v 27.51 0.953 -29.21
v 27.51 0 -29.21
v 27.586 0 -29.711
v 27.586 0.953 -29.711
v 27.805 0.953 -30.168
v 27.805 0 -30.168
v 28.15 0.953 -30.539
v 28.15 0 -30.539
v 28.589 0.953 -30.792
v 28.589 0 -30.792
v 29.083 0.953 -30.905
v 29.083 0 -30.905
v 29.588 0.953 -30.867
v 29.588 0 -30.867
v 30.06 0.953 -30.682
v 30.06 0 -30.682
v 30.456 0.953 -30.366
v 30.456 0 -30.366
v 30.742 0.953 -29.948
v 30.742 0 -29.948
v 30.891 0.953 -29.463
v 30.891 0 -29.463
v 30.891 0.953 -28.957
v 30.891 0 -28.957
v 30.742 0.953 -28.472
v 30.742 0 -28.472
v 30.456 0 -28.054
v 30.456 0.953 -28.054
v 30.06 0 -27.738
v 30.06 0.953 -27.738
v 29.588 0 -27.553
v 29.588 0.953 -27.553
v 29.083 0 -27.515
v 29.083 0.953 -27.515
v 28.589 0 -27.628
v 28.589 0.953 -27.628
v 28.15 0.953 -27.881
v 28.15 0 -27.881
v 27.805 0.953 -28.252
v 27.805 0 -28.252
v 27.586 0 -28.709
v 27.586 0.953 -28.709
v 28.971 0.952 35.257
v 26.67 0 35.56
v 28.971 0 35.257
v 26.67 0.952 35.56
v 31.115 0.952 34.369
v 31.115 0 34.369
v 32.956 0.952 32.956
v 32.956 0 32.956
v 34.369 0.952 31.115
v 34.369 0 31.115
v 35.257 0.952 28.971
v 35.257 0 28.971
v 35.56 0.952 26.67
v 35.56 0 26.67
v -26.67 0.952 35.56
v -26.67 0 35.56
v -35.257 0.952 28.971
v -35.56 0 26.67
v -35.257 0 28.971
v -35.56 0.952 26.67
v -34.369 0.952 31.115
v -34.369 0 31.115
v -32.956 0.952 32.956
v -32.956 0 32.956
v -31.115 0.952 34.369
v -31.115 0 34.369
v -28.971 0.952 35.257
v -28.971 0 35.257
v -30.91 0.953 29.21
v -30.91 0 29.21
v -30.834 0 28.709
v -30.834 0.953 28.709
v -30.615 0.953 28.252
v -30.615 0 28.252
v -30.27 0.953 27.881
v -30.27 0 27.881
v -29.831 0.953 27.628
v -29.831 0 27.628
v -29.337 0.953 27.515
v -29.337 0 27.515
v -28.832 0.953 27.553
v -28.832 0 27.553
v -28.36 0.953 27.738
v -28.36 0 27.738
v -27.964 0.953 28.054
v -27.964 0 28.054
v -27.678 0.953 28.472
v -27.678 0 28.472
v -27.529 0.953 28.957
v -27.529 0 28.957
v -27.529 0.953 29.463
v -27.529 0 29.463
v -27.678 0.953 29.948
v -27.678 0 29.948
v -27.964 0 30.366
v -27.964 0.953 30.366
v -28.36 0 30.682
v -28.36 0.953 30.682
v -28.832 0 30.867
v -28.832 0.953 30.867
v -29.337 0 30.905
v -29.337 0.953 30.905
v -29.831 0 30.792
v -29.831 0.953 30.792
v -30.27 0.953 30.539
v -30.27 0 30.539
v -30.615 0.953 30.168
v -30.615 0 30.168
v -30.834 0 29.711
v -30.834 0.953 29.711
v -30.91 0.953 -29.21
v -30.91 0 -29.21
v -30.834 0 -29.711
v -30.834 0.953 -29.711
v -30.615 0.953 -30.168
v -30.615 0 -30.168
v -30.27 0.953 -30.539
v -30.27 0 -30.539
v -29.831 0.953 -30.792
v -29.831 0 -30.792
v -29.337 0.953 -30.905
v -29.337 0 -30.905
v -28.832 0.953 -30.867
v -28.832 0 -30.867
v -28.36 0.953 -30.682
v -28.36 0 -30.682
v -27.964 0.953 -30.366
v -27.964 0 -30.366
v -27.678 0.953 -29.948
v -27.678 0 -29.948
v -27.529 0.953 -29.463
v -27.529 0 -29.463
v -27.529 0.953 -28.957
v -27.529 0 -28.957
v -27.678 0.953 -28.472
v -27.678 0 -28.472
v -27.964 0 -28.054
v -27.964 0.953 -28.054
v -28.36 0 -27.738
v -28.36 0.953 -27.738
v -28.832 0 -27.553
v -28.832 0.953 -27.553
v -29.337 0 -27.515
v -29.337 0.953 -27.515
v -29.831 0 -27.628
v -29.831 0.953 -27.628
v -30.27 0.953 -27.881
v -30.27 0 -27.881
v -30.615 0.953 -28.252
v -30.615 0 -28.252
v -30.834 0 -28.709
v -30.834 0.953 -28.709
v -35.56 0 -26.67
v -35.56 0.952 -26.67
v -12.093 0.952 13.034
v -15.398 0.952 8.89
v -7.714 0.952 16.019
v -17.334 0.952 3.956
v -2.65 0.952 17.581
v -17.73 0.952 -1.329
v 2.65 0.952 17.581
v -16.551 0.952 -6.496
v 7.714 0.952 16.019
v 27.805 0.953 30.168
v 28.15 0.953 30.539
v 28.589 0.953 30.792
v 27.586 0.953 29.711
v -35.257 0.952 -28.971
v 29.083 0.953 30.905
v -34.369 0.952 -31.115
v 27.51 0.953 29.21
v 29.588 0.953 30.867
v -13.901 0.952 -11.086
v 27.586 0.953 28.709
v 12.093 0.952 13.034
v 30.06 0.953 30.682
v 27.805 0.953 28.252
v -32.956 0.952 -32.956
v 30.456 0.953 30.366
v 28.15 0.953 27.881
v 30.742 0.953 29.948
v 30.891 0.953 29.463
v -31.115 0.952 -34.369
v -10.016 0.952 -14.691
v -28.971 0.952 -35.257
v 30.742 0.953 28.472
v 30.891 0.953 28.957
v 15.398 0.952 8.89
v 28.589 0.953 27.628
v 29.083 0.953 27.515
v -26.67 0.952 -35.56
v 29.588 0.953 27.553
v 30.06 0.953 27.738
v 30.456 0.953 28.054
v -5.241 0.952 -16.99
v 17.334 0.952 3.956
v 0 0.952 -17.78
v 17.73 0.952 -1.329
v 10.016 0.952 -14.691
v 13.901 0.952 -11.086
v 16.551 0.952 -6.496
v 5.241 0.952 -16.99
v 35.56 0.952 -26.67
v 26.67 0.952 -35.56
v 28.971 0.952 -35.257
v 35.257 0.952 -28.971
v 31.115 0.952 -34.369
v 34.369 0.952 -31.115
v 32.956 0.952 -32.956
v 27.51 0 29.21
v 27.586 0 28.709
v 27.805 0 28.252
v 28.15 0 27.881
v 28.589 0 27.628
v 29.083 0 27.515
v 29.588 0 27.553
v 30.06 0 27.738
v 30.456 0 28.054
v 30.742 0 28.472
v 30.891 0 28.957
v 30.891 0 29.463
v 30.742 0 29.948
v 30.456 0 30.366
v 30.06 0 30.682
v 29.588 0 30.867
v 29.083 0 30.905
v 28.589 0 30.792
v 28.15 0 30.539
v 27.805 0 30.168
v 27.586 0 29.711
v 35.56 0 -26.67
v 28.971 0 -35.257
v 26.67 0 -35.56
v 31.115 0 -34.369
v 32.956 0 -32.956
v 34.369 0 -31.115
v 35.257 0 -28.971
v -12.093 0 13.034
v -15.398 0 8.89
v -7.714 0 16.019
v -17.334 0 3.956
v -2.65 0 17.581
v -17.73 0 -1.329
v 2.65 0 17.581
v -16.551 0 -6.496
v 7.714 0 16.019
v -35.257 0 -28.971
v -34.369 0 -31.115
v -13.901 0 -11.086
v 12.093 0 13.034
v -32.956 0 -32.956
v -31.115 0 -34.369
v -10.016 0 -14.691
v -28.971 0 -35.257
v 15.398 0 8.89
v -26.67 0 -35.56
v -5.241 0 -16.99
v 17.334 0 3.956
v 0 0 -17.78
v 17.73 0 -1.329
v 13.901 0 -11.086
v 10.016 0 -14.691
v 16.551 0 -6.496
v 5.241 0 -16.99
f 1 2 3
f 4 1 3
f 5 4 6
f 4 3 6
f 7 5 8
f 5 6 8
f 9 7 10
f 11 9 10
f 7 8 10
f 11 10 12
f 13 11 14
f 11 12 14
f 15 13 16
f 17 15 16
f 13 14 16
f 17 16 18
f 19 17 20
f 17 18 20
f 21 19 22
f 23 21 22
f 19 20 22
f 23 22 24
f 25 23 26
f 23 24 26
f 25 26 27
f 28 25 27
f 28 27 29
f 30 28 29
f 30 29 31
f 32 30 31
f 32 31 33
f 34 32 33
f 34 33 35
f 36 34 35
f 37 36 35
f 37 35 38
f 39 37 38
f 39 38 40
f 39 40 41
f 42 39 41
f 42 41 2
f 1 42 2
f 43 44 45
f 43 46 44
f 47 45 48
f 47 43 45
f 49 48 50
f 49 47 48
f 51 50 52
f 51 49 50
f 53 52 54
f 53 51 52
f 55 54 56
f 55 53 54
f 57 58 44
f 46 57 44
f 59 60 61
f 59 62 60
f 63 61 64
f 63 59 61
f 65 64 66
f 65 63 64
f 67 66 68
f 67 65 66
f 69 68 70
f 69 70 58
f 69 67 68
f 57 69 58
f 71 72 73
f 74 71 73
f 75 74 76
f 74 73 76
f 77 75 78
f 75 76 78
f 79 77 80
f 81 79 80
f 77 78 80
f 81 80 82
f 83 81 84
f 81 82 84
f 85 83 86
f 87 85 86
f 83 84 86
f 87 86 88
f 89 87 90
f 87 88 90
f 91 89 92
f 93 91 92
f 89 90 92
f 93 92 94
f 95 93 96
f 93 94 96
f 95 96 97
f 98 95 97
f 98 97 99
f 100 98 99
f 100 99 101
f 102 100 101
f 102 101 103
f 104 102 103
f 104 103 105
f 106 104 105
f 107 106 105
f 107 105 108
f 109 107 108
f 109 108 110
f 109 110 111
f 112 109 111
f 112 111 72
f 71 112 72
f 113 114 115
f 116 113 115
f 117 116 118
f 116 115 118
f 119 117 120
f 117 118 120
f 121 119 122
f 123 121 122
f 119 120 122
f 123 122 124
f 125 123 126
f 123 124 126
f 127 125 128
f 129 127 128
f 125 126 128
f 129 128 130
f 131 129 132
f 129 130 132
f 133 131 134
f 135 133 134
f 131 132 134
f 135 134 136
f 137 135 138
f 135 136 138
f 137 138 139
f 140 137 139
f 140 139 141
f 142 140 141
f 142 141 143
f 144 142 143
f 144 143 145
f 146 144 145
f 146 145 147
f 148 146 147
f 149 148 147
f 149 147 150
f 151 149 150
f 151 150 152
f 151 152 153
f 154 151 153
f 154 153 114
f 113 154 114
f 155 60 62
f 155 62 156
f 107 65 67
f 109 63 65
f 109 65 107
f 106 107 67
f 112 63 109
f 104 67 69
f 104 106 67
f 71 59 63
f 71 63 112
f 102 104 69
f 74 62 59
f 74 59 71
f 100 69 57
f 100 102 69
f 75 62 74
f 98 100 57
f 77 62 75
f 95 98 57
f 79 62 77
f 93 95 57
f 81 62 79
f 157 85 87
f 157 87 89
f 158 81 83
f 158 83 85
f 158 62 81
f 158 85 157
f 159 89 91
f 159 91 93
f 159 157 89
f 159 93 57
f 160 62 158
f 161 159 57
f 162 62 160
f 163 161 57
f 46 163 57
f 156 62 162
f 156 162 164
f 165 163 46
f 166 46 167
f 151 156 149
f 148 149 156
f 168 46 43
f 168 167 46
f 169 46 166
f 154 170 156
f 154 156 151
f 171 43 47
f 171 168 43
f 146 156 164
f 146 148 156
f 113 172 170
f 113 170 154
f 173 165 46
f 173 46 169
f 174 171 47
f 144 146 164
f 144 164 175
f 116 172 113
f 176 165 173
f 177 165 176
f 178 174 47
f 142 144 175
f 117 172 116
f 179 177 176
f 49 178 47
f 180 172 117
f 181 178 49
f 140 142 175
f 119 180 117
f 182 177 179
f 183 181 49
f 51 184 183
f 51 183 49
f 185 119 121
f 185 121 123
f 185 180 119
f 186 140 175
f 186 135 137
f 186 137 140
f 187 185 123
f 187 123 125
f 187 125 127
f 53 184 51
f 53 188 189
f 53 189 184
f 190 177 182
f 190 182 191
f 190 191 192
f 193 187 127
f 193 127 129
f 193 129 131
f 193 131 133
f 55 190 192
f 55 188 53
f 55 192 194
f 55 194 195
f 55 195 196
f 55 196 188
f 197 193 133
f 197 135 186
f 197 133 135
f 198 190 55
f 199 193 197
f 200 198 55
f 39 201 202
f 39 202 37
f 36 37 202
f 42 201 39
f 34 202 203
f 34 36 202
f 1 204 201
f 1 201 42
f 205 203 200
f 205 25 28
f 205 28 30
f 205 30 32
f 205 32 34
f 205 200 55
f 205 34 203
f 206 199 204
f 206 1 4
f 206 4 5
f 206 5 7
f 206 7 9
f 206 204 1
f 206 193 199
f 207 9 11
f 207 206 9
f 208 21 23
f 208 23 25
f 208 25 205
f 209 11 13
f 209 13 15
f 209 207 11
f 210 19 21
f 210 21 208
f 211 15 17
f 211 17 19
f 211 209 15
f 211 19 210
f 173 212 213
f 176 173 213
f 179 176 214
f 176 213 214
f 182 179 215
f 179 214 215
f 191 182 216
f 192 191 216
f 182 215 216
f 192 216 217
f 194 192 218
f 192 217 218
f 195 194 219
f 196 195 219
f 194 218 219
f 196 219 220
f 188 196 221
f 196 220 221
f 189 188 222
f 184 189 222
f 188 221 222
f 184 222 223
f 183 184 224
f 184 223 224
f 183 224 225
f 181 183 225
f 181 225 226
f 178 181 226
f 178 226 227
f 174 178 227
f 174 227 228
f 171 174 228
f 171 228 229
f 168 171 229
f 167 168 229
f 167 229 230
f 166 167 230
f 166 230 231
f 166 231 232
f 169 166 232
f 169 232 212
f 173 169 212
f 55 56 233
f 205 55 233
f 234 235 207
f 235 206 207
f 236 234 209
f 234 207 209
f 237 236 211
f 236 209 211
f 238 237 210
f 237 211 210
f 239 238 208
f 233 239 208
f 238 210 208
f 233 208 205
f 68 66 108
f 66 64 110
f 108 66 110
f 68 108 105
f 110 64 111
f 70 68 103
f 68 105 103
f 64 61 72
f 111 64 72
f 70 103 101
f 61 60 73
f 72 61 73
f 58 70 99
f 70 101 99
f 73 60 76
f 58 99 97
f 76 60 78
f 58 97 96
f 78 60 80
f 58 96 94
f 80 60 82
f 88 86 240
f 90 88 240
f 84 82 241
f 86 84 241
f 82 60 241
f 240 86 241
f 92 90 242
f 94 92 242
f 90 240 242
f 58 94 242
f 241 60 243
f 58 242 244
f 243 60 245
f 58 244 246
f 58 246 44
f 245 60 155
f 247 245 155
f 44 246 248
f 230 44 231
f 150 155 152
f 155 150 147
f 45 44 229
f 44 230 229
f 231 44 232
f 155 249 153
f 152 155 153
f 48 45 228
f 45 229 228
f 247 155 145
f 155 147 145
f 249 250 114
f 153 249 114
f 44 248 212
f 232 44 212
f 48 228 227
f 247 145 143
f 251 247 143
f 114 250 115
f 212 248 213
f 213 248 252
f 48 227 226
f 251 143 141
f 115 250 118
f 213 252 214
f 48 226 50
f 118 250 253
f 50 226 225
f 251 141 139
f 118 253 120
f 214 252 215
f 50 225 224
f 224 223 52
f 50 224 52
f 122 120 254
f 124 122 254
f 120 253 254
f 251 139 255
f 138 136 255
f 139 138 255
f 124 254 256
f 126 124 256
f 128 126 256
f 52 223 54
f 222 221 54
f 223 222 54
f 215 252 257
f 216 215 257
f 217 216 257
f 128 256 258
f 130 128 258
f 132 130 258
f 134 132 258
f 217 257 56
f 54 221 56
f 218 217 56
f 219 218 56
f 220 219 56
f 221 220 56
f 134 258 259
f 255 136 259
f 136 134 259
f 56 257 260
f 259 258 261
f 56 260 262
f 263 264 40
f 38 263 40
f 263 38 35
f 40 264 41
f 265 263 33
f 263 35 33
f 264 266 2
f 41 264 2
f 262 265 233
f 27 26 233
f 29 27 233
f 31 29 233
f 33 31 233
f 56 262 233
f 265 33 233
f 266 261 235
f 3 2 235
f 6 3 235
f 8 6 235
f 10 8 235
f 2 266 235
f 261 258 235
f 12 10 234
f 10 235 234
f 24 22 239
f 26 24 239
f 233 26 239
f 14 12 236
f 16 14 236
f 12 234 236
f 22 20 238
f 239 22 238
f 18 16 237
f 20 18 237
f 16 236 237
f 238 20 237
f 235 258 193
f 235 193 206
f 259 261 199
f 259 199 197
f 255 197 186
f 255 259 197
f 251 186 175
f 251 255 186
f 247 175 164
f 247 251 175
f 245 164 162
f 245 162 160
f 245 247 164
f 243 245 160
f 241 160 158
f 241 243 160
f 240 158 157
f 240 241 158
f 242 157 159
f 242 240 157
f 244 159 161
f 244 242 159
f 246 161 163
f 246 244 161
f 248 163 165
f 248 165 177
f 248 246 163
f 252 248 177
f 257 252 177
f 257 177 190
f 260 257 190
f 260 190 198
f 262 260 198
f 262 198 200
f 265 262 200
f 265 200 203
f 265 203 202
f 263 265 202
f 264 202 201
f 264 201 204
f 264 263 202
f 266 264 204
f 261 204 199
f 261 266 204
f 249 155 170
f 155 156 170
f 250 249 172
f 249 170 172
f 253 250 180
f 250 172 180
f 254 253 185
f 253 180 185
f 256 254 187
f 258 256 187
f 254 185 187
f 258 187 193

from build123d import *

# Parameters (mm, degrees)
SKETCH1_W            = 71.12
SKETCH1_H            = 71.12
SKETCH1_R            = 17.78
BOSS_EXTRUDE1_DEPTH  = 0.9525
FILLET1_R            = 8.89
M3_CLEARANCE_HOLE1_D = 3.4


with BuildPart() as part:
    # Sketch1 → Boss-Extrude1 (new body)
    with BuildSketch(Plane(origin=(0, 0, 0), x_dir=(1, 0, 0), z_dir=(0, 1, 0))):
        Rectangle(SKETCH1_W, SKETCH1_H)
        with Locations(Location((0, 0, 0), (0, 0, 90))):
            Circle(SKETCH1_R, mode=Mode.SUBTRACT)
    extrude(amount=BOSS_EXTRUDE1_DEPTH)

    # Fillet1
    fillet1_edges = [part.edges().sort_by_distance(p)[0] for p in [
        (35.56, 0.47625, 35.56),
        (-35.56, 0.47625, 35.56),
        (-35.56, 0.47625, -35.56),
        (35.56, 0.47625, -35.56),
    ]]
    fillet(fillet1_edges, radius=FILLET1_R)

    # M3 Clearance Hole1 (through all)
    with Locations(Plane(origin=(0, 0.9525, 0), x_dir=(1, 0, 0), z_dir=(0, 1, 0))):
        with Locations((-29.21, -29.21), (29.21, -29.21), (29.21, 29.21), (-29.21, 29.21)):
            Hole(M3_CLEARANCE_HOLE1_D / 2)


solid = part.part
